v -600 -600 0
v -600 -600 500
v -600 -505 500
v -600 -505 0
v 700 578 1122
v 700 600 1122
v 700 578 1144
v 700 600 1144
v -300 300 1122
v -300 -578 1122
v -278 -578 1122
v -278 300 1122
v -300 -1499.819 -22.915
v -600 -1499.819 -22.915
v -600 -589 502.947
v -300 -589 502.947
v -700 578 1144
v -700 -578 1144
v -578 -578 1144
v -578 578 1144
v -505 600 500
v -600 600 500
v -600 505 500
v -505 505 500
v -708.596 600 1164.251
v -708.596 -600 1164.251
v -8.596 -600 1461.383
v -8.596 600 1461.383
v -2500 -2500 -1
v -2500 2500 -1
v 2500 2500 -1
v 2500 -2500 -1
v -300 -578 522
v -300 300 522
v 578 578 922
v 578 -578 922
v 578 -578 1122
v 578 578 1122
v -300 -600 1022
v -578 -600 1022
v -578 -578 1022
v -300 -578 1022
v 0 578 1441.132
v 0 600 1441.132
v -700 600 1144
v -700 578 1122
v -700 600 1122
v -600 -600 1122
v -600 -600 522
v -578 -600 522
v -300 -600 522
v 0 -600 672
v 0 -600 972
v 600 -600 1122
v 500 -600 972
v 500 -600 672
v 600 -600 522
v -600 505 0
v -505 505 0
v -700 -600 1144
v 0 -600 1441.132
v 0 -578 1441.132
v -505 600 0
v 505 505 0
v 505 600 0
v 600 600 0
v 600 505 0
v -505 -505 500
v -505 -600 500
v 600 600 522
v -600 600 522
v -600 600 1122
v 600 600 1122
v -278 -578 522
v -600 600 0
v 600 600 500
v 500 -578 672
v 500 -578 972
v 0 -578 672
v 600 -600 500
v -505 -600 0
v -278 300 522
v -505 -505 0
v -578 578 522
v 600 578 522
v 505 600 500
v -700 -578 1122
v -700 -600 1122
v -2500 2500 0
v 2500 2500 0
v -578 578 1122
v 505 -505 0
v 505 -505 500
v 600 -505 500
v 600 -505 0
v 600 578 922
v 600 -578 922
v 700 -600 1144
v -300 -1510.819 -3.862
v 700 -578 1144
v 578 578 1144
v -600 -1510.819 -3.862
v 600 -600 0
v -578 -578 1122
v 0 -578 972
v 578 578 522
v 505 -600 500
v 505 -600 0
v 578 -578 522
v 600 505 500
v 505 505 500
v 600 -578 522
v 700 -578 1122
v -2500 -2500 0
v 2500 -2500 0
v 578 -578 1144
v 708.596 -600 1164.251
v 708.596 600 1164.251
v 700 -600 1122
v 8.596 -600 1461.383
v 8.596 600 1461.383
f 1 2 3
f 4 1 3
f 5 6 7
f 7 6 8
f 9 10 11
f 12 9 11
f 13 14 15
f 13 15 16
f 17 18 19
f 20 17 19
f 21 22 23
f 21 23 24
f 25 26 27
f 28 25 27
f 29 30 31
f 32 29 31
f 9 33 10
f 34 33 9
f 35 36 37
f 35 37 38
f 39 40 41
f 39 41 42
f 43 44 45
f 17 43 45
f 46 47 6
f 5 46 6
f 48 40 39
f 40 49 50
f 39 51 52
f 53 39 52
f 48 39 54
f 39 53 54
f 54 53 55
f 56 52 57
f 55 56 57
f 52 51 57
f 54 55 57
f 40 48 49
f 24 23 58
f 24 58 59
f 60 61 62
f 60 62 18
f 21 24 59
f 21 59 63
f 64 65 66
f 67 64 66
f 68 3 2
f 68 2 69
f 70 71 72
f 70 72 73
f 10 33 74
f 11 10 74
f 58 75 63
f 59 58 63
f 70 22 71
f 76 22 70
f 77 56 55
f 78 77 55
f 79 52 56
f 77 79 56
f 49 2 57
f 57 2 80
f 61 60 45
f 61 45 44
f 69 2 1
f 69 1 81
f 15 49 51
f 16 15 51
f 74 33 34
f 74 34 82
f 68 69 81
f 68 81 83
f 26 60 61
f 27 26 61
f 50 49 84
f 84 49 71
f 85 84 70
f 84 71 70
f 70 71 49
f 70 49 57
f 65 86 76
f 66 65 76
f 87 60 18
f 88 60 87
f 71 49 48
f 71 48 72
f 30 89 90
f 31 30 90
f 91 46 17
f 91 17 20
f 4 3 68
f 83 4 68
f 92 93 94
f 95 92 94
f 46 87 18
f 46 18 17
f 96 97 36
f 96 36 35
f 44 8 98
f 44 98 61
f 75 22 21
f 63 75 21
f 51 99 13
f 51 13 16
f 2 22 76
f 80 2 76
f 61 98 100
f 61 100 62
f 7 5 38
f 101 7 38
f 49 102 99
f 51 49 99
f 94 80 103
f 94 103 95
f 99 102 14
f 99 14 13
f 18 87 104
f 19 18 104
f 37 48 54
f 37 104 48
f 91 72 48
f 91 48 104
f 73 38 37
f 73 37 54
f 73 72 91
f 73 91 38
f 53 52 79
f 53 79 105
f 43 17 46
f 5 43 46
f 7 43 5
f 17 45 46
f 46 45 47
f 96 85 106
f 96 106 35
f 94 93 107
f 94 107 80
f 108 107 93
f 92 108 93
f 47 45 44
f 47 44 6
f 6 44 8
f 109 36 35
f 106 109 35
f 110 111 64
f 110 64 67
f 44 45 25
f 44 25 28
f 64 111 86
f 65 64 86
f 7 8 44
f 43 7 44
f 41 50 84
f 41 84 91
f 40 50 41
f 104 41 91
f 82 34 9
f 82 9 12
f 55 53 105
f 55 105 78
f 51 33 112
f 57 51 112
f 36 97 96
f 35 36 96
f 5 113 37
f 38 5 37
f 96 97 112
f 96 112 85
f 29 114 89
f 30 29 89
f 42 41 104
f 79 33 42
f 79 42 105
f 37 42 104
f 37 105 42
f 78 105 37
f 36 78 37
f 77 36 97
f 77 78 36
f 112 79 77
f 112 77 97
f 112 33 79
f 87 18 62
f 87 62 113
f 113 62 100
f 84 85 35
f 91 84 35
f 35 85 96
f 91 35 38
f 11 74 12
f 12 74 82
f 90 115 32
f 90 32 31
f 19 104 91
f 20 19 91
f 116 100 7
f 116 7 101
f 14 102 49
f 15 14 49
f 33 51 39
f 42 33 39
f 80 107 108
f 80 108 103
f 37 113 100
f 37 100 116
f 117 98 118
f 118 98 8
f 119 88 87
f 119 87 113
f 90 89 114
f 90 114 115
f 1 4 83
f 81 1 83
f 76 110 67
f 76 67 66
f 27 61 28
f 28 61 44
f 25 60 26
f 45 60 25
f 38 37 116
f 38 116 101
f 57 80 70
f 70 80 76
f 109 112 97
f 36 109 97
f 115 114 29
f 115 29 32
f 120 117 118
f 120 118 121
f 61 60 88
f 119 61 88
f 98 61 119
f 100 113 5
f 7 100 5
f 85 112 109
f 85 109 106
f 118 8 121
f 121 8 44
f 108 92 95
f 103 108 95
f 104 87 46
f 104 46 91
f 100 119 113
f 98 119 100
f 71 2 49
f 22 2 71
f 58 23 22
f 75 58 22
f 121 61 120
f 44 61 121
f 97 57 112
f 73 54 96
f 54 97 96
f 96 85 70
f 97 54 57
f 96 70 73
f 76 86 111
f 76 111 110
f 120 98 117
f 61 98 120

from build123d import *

# Parameters (mm, degrees)
F0_W      = 5000
F0_H      = 5000
F1_DEPTH  = 1
F3_W      = 1200
F3_H      = 1200
F4_DEPTH  = 22
F5_W      = 95
F5_H      = 95
F6_DEPTH  = 500
F7_W      = 1200
F7_H      = 1200
F7_W_2    = 1156
F7_H_2    = 1156
F8_DEPTH  = 600
F10_W     = 300
F10_H     = 1051.723809
F11_DEPTH = 22
F12_W     = 22
F12_H     = 878
F13_DEPTH = 600
F14_W     = 278
F14_H     = 500
F15_DEPTH = 22
F16_W     = 1156
F16_H     = 400
F17_DEPTH = 22
F18_W     = 1156
F18_H     = 400
F19_DEPTH = 22
F20_W     = 500
F20_H     = 300
F21_DEPTH = 22
F23_DEPTH = 22
F25_W     = 122
F25_H     = 1156
F26_DEPTH = 22
F28_W     = 760.452264
F28_H     = 1200
F29_DEPTH = 22


with BuildPart() as f1:
    # F0 (on Top) → F1 (new body)
    with BuildSketch(Plane.XY):
        Rectangle(F0_W, F0_H)
    extrude(amount=-F1_DEPTH)


with BuildPart() as f4:
    # F3 (on offset) → F4 (new body)
    with BuildSketch(Plane.XY.offset(500)):
        Rectangle(F3_W, F3_H)
    extrude(amount=F4_DEPTH)


with BuildPart() as f6:
    # F5 (on offset) → F6 (new body, through all)
    with BuildSketch(Plane.XY.offset(500)):
        with Locations((-552.5, 552.5)):
            Rectangle(F5_W, F5_H)
        with Locations((552.5, 552.5)):
            Rectangle(F5_W, F5_H)
        with Locations((-552.5, -552.5)):
            Rectangle(F5_W, F5_H)
        with Locations((552.5, -552.5)):
            Rectangle(F5_W, F5_H)
    extrude(amount=-F6_DEPTH)


with BuildPart() as f8:
    # F7 (on face) → F8 (new body)
    with BuildSketch(Plane.XY.offset(522)):
        Rectangle(F7_W, F7_H)
        Rectangle(F7_W_2, F7_H_2, mode=Mode.SUBTRACT)
    extrude(amount=F8_DEPTH)

    # F14 (on face) → F15 (cut, through all)
    with BuildSketch(Plane.XZ.offset(600)):
        with Locations((-439, 772)):
            Rectangle(F14_W, F14_H)
    extrude(amount=-F15_DEPTH, mode=Mode.SUBTRACT)

    # F16 (on face) → F17 (cut, through all)
    with BuildSketch(Plane.YZ.offset(600)):
        with Locations((0, 722)):
            Rectangle(F16_W, F16_H)
    extrude(amount=-F17_DEPTH, mode=Mode.SUBTRACT)

    # F20 (on face) → F21 (cut, through all)
    with BuildSketch(Plane.XZ.offset(600)):
        with Locations((250, 822)):
            Rectangle(F20_W, F20_H)
    extrude(amount=-F21_DEPTH, mode=Mode.SUBTRACT)


with BuildPart() as f11:
    # F10 (on face) → F11 (new body)
    with BuildSketch(Plane(origin=(0, -376.03263, 651.307621), x_dir=(1, 0, 0), z_dir=(0, -0.5, 0.866025))):
        with Locations((-450, -784.477146)):
            Rectangle(F10_W, F10_H)
    extrude(amount=-F11_DEPTH)


with BuildPart() as f13:
    # F12 (on face) → F13 (new body)
    with BuildSketch(Plane.XY.offset(522)):
        with Locations((-289, -139)):
            Rectangle(F12_W, F12_H)
    extrude(amount=F13_DEPTH)


with BuildPart() as f19:
    # F18 (on face) → F19 (new body)
    with BuildSketch(Plane.YZ.offset(600)):
        with Locations((0, 722)):
            Rectangle(F18_W, F18_H)
    extrude(amount=-F19_DEPTH)


with BuildPart() as f23:
    # F22 (on face) → F23 (new body)
    with BuildSketch(Plane.XZ.offset(600)):
        Polygon((-700, 1144), (-700, 1122), (700, 1122), (700, 1144), (0, 1441.132371), align=None)
    extrude(amount=-F23_DEPTH)


with BuildPart() as f24_1:
    # F24: instance of F23
    add(f23.part.mirror(Plane.XZ))


with BuildPart() as f26:
    # F25 (on face) → F26 (new body)
    with BuildSketch(Plane.XY.offset(1122)):
        with Locations((-639, 0)):
            Rectangle(F25_W, F25_H)
    extrude(amount=F26_DEPTH)


with BuildPart() as f27_1:
    # F27: instance of F26
    add(f26.part.mirror(Plane.YZ))


with BuildPart() as f29:
    # F28 (on face) → F29 (new body)
    with BuildSketch(Plane(origin=(-518.331936, 0, 1221.113518), x_dir=(0.920505, 0, 0.390731), z_dir=(-0.390731, 0, 0.920505))):
        with Locations((182.869146, 0)):
            Rectangle(F28_W, F28_H)
    extrude(amount=F29_DEPTH)


with BuildPart() as f30_1:
    # F30: instance of F29
    add(f29.part.mirror(Plane.YZ))


solid = Compound([f1.part, f4.part, f6.part, f8.part, f11.part, f13.part, f19.part, f23.part, f24_1.part, f26.part, f27_1.part, f29.part, f30_1.part])
